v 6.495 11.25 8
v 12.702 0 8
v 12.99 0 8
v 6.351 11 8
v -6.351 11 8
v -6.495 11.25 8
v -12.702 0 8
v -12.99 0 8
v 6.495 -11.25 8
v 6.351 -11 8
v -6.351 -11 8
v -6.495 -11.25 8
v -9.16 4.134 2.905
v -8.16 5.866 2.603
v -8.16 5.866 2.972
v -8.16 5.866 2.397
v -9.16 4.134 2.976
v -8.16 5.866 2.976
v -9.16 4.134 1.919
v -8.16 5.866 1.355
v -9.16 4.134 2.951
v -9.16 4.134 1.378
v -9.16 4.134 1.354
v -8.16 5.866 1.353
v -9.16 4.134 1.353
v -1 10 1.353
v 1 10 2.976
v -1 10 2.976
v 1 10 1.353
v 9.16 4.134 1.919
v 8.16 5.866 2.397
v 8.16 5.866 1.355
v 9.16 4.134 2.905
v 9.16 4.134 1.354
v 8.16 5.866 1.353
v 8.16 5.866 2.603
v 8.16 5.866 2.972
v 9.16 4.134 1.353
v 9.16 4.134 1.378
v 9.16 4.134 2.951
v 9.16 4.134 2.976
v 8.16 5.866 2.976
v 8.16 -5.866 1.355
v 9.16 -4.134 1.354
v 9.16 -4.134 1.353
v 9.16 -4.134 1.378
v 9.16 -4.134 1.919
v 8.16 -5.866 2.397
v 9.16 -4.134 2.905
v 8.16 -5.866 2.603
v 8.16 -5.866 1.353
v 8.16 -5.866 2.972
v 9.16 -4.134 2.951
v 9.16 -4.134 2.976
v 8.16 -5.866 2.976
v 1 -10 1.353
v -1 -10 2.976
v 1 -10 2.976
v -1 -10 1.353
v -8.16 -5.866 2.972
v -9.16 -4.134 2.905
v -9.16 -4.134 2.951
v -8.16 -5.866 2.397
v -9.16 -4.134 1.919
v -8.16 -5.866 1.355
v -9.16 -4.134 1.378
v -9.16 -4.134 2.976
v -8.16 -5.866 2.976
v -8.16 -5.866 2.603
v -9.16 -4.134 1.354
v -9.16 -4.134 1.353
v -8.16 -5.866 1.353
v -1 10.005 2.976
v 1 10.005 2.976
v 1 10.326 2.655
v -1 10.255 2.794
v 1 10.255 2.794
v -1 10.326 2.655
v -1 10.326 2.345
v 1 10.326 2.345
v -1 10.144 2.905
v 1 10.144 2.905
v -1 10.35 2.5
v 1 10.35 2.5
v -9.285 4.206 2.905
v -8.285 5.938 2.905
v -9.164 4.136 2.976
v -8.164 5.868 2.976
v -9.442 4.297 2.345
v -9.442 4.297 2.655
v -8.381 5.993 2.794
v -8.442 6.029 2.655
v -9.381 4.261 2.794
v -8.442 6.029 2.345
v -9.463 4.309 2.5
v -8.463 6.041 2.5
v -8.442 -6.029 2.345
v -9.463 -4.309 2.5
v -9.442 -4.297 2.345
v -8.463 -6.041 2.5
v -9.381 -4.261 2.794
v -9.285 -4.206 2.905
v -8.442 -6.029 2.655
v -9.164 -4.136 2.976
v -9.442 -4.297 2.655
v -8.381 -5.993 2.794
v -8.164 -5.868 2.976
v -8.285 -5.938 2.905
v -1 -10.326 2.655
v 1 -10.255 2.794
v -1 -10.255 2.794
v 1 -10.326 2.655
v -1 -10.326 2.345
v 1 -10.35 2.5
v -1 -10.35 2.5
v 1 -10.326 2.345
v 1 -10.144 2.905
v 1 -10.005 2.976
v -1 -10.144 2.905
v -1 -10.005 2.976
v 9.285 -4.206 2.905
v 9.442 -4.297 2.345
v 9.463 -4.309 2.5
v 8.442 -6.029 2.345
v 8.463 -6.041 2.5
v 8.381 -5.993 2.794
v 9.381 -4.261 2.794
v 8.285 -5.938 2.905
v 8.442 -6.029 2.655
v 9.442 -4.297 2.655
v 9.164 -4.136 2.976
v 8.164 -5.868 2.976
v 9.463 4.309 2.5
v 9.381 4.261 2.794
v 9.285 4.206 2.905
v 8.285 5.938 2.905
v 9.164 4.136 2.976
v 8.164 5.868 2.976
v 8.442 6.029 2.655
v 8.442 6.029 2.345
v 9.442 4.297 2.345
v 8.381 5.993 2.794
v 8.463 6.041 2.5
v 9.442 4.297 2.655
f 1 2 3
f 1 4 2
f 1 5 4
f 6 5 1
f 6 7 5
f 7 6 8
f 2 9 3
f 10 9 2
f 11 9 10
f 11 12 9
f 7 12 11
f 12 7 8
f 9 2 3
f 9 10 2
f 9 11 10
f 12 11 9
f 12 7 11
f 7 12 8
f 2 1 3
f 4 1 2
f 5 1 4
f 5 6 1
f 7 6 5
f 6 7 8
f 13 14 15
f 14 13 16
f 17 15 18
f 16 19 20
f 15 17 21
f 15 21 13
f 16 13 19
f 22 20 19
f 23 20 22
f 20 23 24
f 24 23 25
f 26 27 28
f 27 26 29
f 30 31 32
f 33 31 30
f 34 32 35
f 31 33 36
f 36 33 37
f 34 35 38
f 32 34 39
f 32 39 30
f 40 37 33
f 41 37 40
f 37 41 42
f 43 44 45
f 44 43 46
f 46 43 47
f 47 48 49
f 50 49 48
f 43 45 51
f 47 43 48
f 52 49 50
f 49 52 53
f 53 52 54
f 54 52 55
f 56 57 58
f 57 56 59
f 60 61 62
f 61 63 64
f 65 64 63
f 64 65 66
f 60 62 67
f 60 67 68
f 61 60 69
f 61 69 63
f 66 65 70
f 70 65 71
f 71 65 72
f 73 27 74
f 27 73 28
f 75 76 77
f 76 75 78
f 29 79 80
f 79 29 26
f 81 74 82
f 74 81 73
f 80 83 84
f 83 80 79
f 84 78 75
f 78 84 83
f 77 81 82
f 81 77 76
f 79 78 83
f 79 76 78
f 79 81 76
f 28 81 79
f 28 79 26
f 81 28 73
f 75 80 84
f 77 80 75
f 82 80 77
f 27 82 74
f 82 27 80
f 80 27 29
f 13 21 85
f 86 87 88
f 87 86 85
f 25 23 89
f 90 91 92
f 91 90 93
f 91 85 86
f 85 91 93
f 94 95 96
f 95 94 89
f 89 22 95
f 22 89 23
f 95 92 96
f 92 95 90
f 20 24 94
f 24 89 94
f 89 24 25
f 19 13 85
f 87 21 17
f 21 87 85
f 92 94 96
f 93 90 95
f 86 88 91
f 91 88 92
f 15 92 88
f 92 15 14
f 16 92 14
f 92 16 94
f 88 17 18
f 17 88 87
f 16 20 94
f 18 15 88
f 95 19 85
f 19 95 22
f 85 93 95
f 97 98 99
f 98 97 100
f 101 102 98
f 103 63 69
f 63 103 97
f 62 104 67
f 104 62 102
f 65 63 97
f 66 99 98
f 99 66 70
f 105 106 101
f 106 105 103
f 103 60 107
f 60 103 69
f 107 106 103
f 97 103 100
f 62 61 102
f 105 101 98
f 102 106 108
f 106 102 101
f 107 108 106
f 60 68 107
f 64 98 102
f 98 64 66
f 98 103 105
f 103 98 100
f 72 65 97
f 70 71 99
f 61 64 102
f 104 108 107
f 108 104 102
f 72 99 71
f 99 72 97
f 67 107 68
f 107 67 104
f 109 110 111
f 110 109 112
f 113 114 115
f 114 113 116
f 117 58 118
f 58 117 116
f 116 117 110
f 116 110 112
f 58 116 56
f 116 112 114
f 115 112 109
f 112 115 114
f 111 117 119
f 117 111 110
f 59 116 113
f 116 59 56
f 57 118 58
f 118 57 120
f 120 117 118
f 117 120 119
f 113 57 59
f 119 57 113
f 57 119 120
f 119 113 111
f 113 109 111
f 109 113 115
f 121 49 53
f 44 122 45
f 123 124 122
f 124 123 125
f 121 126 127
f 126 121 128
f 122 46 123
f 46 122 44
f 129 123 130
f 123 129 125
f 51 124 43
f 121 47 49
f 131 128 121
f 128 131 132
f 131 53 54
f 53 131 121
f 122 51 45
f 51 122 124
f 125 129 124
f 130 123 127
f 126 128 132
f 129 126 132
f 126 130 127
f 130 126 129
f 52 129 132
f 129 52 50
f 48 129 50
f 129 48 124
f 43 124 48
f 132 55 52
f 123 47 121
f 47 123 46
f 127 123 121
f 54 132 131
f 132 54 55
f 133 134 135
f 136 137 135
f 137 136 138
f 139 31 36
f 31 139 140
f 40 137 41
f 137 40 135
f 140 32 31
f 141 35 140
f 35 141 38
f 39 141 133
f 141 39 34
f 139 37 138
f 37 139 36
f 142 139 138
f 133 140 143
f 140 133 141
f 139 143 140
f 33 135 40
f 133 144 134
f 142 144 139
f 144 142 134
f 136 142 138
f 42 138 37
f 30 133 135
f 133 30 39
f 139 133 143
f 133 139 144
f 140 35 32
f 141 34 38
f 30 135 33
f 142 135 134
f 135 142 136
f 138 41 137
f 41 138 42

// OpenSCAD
// file: ../hsw.scad
// hsw.scad: shared sizes and cell geometry for the honeycomb storage wall.
//
// The wall, the inserts and the clips all read their sizes from here, so a
// change to the hole, the wall or the depth carries through to every part.
// Include it before setting any of these in your own file to override them.
//
// Coordinates: the wall lies in the XY plane, back face at z = 0, front face
// at z = hsw_depth. Cells are hexagons with corners at 0 and 180 degrees,
// columns along x.

/* [Honeycomb size] */
// Hole across flats (mm)
hsw_hole = 20;
// Wall around each hole (mm); neighbouring cells sit wall to wall
hsw_wall = 1.8;
// Grid depth, back to front (mm)
hsw_depth = 8;

/* [Insert lock] */
// Height above the back face where the hole starts to widen (mm)
hsw_lock_z = 5.1;
// Depth of the wider opening at the front (mm)
hsw_lip_depth = 2;
// How much each wall thins in the front opening (mm)
hsw_lip = 1;
// Chamfer on the back edge of each hole, against elephant's foot (mm)
hsw_back_chamfer_w = 0.4;
hsw_back_chamfer_h = 0.5;

// ---------------- Derived ----------------
// Outer cell across flats, and the cell's side (= circumradius)
function hsw_cell_flats() = hsw_hole + 2 * hsw_wall;
function hsw_cell_side() = hsw_cell_flats() / sqrt(3);
// Centre-to-centre spacing: between columns, and between rows in a column
function hsw_pitch_x() = 1.5 * hsw_cell_side();
function hsw_pitch_y() = hsw_cell_flats();
// Hole across flats at the front opening
function hsw_front_hole() = hsw_hole + 2 * hsw_lip;

// The hole's width across flats from the back face (z = 0) to the front:
// chamfered at the back, straight to the lock, widening to the front opening.
function hsw_hole_profile(depth = hsw_depth) =
    [
        [hsw_hole + 2 * hsw_back_chamfer_w, 0],
        [hsw_hole, hsw_back_chamfer_h],
        [hsw_hole, hsw_lock_z],
        [hsw_front_hole(), depth - hsw_lip_depth],
        [hsw_front_hole(), depth],
    ];

// A regular hexagon across flats f, corners at 0 and 180 degrees.
module hsw_hexagon(f) {
    circle(r=f / sqrt(3), $fn=6);
}

// The hole as a solid, slightly longer than the cell so it cuts cleanly.
module hsw_hole_solid(depth = hsw_depth) {
    p = hsw_hole_profile(depth);
    e = 0.01;
    rotate_extrude($fn=6)
        polygon(
            concat(
                [[0, -e], [p[0][0] / sqrt(3), -e]],
                [for (q = p) [q[0] / sqrt(3), q[1]]],
                [[p[len(p) - 1][0] / sqrt(3), depth + e], [0, depth + e]]
            )
        );
}

// One cell: the outer hexagon less its hole.
module hsw_cell(depth = hsw_depth) {
    assert(
        depth >= hsw_lock_z + hsw_lip_depth,
        str("hsw_depth must be at least hsw_lock_z + hsw_lip_depth (", hsw_lock_z + hsw_lip_depth, " mm)")
    );
    difference() {
        linear_extrude(depth) hsw_hexagon(hsw_cell_flats());
        hsw_hole_solid(depth);
    }
}

// A straight wall with the hole's profile on its inner face, for closing a
// cut cell along a flat edge. It lies along y from 0 to len, outer face at
// x = 0 and inner face at x = hsw_wall, toward +x.
module hsw_edge_wall(len, depth = hsw_depth) {
    p = hsw_hole_profile(depth);
    rotate([90, 0, 0]) translate([0, 0, -len])
            linear_extrude(len)
                polygon(
                    concat(
                        [[0, 0]],
                        [for (q = p) [hsw_wall - (q[0] - hsw_hole) / 2, q[1]]],
                        [[0, depth]]
                    )
                );
}
// main file
// One insert seated in one cell, intersected with it. The insert's lip face
// is its z = 0; seated, the lip lies on the wall's front face and the body
// reaches back into the hole. Only the six snaps should press into the wall.
include <../inserts.scad>

TYPE = 1;
intersection() {
    hsw_cell();
    translate([0, 0, hsw_depth + ins_lip_h]) mirror([0, 0, 1]) hsw_insert(TYPE, tol=0, deco=false);
}
